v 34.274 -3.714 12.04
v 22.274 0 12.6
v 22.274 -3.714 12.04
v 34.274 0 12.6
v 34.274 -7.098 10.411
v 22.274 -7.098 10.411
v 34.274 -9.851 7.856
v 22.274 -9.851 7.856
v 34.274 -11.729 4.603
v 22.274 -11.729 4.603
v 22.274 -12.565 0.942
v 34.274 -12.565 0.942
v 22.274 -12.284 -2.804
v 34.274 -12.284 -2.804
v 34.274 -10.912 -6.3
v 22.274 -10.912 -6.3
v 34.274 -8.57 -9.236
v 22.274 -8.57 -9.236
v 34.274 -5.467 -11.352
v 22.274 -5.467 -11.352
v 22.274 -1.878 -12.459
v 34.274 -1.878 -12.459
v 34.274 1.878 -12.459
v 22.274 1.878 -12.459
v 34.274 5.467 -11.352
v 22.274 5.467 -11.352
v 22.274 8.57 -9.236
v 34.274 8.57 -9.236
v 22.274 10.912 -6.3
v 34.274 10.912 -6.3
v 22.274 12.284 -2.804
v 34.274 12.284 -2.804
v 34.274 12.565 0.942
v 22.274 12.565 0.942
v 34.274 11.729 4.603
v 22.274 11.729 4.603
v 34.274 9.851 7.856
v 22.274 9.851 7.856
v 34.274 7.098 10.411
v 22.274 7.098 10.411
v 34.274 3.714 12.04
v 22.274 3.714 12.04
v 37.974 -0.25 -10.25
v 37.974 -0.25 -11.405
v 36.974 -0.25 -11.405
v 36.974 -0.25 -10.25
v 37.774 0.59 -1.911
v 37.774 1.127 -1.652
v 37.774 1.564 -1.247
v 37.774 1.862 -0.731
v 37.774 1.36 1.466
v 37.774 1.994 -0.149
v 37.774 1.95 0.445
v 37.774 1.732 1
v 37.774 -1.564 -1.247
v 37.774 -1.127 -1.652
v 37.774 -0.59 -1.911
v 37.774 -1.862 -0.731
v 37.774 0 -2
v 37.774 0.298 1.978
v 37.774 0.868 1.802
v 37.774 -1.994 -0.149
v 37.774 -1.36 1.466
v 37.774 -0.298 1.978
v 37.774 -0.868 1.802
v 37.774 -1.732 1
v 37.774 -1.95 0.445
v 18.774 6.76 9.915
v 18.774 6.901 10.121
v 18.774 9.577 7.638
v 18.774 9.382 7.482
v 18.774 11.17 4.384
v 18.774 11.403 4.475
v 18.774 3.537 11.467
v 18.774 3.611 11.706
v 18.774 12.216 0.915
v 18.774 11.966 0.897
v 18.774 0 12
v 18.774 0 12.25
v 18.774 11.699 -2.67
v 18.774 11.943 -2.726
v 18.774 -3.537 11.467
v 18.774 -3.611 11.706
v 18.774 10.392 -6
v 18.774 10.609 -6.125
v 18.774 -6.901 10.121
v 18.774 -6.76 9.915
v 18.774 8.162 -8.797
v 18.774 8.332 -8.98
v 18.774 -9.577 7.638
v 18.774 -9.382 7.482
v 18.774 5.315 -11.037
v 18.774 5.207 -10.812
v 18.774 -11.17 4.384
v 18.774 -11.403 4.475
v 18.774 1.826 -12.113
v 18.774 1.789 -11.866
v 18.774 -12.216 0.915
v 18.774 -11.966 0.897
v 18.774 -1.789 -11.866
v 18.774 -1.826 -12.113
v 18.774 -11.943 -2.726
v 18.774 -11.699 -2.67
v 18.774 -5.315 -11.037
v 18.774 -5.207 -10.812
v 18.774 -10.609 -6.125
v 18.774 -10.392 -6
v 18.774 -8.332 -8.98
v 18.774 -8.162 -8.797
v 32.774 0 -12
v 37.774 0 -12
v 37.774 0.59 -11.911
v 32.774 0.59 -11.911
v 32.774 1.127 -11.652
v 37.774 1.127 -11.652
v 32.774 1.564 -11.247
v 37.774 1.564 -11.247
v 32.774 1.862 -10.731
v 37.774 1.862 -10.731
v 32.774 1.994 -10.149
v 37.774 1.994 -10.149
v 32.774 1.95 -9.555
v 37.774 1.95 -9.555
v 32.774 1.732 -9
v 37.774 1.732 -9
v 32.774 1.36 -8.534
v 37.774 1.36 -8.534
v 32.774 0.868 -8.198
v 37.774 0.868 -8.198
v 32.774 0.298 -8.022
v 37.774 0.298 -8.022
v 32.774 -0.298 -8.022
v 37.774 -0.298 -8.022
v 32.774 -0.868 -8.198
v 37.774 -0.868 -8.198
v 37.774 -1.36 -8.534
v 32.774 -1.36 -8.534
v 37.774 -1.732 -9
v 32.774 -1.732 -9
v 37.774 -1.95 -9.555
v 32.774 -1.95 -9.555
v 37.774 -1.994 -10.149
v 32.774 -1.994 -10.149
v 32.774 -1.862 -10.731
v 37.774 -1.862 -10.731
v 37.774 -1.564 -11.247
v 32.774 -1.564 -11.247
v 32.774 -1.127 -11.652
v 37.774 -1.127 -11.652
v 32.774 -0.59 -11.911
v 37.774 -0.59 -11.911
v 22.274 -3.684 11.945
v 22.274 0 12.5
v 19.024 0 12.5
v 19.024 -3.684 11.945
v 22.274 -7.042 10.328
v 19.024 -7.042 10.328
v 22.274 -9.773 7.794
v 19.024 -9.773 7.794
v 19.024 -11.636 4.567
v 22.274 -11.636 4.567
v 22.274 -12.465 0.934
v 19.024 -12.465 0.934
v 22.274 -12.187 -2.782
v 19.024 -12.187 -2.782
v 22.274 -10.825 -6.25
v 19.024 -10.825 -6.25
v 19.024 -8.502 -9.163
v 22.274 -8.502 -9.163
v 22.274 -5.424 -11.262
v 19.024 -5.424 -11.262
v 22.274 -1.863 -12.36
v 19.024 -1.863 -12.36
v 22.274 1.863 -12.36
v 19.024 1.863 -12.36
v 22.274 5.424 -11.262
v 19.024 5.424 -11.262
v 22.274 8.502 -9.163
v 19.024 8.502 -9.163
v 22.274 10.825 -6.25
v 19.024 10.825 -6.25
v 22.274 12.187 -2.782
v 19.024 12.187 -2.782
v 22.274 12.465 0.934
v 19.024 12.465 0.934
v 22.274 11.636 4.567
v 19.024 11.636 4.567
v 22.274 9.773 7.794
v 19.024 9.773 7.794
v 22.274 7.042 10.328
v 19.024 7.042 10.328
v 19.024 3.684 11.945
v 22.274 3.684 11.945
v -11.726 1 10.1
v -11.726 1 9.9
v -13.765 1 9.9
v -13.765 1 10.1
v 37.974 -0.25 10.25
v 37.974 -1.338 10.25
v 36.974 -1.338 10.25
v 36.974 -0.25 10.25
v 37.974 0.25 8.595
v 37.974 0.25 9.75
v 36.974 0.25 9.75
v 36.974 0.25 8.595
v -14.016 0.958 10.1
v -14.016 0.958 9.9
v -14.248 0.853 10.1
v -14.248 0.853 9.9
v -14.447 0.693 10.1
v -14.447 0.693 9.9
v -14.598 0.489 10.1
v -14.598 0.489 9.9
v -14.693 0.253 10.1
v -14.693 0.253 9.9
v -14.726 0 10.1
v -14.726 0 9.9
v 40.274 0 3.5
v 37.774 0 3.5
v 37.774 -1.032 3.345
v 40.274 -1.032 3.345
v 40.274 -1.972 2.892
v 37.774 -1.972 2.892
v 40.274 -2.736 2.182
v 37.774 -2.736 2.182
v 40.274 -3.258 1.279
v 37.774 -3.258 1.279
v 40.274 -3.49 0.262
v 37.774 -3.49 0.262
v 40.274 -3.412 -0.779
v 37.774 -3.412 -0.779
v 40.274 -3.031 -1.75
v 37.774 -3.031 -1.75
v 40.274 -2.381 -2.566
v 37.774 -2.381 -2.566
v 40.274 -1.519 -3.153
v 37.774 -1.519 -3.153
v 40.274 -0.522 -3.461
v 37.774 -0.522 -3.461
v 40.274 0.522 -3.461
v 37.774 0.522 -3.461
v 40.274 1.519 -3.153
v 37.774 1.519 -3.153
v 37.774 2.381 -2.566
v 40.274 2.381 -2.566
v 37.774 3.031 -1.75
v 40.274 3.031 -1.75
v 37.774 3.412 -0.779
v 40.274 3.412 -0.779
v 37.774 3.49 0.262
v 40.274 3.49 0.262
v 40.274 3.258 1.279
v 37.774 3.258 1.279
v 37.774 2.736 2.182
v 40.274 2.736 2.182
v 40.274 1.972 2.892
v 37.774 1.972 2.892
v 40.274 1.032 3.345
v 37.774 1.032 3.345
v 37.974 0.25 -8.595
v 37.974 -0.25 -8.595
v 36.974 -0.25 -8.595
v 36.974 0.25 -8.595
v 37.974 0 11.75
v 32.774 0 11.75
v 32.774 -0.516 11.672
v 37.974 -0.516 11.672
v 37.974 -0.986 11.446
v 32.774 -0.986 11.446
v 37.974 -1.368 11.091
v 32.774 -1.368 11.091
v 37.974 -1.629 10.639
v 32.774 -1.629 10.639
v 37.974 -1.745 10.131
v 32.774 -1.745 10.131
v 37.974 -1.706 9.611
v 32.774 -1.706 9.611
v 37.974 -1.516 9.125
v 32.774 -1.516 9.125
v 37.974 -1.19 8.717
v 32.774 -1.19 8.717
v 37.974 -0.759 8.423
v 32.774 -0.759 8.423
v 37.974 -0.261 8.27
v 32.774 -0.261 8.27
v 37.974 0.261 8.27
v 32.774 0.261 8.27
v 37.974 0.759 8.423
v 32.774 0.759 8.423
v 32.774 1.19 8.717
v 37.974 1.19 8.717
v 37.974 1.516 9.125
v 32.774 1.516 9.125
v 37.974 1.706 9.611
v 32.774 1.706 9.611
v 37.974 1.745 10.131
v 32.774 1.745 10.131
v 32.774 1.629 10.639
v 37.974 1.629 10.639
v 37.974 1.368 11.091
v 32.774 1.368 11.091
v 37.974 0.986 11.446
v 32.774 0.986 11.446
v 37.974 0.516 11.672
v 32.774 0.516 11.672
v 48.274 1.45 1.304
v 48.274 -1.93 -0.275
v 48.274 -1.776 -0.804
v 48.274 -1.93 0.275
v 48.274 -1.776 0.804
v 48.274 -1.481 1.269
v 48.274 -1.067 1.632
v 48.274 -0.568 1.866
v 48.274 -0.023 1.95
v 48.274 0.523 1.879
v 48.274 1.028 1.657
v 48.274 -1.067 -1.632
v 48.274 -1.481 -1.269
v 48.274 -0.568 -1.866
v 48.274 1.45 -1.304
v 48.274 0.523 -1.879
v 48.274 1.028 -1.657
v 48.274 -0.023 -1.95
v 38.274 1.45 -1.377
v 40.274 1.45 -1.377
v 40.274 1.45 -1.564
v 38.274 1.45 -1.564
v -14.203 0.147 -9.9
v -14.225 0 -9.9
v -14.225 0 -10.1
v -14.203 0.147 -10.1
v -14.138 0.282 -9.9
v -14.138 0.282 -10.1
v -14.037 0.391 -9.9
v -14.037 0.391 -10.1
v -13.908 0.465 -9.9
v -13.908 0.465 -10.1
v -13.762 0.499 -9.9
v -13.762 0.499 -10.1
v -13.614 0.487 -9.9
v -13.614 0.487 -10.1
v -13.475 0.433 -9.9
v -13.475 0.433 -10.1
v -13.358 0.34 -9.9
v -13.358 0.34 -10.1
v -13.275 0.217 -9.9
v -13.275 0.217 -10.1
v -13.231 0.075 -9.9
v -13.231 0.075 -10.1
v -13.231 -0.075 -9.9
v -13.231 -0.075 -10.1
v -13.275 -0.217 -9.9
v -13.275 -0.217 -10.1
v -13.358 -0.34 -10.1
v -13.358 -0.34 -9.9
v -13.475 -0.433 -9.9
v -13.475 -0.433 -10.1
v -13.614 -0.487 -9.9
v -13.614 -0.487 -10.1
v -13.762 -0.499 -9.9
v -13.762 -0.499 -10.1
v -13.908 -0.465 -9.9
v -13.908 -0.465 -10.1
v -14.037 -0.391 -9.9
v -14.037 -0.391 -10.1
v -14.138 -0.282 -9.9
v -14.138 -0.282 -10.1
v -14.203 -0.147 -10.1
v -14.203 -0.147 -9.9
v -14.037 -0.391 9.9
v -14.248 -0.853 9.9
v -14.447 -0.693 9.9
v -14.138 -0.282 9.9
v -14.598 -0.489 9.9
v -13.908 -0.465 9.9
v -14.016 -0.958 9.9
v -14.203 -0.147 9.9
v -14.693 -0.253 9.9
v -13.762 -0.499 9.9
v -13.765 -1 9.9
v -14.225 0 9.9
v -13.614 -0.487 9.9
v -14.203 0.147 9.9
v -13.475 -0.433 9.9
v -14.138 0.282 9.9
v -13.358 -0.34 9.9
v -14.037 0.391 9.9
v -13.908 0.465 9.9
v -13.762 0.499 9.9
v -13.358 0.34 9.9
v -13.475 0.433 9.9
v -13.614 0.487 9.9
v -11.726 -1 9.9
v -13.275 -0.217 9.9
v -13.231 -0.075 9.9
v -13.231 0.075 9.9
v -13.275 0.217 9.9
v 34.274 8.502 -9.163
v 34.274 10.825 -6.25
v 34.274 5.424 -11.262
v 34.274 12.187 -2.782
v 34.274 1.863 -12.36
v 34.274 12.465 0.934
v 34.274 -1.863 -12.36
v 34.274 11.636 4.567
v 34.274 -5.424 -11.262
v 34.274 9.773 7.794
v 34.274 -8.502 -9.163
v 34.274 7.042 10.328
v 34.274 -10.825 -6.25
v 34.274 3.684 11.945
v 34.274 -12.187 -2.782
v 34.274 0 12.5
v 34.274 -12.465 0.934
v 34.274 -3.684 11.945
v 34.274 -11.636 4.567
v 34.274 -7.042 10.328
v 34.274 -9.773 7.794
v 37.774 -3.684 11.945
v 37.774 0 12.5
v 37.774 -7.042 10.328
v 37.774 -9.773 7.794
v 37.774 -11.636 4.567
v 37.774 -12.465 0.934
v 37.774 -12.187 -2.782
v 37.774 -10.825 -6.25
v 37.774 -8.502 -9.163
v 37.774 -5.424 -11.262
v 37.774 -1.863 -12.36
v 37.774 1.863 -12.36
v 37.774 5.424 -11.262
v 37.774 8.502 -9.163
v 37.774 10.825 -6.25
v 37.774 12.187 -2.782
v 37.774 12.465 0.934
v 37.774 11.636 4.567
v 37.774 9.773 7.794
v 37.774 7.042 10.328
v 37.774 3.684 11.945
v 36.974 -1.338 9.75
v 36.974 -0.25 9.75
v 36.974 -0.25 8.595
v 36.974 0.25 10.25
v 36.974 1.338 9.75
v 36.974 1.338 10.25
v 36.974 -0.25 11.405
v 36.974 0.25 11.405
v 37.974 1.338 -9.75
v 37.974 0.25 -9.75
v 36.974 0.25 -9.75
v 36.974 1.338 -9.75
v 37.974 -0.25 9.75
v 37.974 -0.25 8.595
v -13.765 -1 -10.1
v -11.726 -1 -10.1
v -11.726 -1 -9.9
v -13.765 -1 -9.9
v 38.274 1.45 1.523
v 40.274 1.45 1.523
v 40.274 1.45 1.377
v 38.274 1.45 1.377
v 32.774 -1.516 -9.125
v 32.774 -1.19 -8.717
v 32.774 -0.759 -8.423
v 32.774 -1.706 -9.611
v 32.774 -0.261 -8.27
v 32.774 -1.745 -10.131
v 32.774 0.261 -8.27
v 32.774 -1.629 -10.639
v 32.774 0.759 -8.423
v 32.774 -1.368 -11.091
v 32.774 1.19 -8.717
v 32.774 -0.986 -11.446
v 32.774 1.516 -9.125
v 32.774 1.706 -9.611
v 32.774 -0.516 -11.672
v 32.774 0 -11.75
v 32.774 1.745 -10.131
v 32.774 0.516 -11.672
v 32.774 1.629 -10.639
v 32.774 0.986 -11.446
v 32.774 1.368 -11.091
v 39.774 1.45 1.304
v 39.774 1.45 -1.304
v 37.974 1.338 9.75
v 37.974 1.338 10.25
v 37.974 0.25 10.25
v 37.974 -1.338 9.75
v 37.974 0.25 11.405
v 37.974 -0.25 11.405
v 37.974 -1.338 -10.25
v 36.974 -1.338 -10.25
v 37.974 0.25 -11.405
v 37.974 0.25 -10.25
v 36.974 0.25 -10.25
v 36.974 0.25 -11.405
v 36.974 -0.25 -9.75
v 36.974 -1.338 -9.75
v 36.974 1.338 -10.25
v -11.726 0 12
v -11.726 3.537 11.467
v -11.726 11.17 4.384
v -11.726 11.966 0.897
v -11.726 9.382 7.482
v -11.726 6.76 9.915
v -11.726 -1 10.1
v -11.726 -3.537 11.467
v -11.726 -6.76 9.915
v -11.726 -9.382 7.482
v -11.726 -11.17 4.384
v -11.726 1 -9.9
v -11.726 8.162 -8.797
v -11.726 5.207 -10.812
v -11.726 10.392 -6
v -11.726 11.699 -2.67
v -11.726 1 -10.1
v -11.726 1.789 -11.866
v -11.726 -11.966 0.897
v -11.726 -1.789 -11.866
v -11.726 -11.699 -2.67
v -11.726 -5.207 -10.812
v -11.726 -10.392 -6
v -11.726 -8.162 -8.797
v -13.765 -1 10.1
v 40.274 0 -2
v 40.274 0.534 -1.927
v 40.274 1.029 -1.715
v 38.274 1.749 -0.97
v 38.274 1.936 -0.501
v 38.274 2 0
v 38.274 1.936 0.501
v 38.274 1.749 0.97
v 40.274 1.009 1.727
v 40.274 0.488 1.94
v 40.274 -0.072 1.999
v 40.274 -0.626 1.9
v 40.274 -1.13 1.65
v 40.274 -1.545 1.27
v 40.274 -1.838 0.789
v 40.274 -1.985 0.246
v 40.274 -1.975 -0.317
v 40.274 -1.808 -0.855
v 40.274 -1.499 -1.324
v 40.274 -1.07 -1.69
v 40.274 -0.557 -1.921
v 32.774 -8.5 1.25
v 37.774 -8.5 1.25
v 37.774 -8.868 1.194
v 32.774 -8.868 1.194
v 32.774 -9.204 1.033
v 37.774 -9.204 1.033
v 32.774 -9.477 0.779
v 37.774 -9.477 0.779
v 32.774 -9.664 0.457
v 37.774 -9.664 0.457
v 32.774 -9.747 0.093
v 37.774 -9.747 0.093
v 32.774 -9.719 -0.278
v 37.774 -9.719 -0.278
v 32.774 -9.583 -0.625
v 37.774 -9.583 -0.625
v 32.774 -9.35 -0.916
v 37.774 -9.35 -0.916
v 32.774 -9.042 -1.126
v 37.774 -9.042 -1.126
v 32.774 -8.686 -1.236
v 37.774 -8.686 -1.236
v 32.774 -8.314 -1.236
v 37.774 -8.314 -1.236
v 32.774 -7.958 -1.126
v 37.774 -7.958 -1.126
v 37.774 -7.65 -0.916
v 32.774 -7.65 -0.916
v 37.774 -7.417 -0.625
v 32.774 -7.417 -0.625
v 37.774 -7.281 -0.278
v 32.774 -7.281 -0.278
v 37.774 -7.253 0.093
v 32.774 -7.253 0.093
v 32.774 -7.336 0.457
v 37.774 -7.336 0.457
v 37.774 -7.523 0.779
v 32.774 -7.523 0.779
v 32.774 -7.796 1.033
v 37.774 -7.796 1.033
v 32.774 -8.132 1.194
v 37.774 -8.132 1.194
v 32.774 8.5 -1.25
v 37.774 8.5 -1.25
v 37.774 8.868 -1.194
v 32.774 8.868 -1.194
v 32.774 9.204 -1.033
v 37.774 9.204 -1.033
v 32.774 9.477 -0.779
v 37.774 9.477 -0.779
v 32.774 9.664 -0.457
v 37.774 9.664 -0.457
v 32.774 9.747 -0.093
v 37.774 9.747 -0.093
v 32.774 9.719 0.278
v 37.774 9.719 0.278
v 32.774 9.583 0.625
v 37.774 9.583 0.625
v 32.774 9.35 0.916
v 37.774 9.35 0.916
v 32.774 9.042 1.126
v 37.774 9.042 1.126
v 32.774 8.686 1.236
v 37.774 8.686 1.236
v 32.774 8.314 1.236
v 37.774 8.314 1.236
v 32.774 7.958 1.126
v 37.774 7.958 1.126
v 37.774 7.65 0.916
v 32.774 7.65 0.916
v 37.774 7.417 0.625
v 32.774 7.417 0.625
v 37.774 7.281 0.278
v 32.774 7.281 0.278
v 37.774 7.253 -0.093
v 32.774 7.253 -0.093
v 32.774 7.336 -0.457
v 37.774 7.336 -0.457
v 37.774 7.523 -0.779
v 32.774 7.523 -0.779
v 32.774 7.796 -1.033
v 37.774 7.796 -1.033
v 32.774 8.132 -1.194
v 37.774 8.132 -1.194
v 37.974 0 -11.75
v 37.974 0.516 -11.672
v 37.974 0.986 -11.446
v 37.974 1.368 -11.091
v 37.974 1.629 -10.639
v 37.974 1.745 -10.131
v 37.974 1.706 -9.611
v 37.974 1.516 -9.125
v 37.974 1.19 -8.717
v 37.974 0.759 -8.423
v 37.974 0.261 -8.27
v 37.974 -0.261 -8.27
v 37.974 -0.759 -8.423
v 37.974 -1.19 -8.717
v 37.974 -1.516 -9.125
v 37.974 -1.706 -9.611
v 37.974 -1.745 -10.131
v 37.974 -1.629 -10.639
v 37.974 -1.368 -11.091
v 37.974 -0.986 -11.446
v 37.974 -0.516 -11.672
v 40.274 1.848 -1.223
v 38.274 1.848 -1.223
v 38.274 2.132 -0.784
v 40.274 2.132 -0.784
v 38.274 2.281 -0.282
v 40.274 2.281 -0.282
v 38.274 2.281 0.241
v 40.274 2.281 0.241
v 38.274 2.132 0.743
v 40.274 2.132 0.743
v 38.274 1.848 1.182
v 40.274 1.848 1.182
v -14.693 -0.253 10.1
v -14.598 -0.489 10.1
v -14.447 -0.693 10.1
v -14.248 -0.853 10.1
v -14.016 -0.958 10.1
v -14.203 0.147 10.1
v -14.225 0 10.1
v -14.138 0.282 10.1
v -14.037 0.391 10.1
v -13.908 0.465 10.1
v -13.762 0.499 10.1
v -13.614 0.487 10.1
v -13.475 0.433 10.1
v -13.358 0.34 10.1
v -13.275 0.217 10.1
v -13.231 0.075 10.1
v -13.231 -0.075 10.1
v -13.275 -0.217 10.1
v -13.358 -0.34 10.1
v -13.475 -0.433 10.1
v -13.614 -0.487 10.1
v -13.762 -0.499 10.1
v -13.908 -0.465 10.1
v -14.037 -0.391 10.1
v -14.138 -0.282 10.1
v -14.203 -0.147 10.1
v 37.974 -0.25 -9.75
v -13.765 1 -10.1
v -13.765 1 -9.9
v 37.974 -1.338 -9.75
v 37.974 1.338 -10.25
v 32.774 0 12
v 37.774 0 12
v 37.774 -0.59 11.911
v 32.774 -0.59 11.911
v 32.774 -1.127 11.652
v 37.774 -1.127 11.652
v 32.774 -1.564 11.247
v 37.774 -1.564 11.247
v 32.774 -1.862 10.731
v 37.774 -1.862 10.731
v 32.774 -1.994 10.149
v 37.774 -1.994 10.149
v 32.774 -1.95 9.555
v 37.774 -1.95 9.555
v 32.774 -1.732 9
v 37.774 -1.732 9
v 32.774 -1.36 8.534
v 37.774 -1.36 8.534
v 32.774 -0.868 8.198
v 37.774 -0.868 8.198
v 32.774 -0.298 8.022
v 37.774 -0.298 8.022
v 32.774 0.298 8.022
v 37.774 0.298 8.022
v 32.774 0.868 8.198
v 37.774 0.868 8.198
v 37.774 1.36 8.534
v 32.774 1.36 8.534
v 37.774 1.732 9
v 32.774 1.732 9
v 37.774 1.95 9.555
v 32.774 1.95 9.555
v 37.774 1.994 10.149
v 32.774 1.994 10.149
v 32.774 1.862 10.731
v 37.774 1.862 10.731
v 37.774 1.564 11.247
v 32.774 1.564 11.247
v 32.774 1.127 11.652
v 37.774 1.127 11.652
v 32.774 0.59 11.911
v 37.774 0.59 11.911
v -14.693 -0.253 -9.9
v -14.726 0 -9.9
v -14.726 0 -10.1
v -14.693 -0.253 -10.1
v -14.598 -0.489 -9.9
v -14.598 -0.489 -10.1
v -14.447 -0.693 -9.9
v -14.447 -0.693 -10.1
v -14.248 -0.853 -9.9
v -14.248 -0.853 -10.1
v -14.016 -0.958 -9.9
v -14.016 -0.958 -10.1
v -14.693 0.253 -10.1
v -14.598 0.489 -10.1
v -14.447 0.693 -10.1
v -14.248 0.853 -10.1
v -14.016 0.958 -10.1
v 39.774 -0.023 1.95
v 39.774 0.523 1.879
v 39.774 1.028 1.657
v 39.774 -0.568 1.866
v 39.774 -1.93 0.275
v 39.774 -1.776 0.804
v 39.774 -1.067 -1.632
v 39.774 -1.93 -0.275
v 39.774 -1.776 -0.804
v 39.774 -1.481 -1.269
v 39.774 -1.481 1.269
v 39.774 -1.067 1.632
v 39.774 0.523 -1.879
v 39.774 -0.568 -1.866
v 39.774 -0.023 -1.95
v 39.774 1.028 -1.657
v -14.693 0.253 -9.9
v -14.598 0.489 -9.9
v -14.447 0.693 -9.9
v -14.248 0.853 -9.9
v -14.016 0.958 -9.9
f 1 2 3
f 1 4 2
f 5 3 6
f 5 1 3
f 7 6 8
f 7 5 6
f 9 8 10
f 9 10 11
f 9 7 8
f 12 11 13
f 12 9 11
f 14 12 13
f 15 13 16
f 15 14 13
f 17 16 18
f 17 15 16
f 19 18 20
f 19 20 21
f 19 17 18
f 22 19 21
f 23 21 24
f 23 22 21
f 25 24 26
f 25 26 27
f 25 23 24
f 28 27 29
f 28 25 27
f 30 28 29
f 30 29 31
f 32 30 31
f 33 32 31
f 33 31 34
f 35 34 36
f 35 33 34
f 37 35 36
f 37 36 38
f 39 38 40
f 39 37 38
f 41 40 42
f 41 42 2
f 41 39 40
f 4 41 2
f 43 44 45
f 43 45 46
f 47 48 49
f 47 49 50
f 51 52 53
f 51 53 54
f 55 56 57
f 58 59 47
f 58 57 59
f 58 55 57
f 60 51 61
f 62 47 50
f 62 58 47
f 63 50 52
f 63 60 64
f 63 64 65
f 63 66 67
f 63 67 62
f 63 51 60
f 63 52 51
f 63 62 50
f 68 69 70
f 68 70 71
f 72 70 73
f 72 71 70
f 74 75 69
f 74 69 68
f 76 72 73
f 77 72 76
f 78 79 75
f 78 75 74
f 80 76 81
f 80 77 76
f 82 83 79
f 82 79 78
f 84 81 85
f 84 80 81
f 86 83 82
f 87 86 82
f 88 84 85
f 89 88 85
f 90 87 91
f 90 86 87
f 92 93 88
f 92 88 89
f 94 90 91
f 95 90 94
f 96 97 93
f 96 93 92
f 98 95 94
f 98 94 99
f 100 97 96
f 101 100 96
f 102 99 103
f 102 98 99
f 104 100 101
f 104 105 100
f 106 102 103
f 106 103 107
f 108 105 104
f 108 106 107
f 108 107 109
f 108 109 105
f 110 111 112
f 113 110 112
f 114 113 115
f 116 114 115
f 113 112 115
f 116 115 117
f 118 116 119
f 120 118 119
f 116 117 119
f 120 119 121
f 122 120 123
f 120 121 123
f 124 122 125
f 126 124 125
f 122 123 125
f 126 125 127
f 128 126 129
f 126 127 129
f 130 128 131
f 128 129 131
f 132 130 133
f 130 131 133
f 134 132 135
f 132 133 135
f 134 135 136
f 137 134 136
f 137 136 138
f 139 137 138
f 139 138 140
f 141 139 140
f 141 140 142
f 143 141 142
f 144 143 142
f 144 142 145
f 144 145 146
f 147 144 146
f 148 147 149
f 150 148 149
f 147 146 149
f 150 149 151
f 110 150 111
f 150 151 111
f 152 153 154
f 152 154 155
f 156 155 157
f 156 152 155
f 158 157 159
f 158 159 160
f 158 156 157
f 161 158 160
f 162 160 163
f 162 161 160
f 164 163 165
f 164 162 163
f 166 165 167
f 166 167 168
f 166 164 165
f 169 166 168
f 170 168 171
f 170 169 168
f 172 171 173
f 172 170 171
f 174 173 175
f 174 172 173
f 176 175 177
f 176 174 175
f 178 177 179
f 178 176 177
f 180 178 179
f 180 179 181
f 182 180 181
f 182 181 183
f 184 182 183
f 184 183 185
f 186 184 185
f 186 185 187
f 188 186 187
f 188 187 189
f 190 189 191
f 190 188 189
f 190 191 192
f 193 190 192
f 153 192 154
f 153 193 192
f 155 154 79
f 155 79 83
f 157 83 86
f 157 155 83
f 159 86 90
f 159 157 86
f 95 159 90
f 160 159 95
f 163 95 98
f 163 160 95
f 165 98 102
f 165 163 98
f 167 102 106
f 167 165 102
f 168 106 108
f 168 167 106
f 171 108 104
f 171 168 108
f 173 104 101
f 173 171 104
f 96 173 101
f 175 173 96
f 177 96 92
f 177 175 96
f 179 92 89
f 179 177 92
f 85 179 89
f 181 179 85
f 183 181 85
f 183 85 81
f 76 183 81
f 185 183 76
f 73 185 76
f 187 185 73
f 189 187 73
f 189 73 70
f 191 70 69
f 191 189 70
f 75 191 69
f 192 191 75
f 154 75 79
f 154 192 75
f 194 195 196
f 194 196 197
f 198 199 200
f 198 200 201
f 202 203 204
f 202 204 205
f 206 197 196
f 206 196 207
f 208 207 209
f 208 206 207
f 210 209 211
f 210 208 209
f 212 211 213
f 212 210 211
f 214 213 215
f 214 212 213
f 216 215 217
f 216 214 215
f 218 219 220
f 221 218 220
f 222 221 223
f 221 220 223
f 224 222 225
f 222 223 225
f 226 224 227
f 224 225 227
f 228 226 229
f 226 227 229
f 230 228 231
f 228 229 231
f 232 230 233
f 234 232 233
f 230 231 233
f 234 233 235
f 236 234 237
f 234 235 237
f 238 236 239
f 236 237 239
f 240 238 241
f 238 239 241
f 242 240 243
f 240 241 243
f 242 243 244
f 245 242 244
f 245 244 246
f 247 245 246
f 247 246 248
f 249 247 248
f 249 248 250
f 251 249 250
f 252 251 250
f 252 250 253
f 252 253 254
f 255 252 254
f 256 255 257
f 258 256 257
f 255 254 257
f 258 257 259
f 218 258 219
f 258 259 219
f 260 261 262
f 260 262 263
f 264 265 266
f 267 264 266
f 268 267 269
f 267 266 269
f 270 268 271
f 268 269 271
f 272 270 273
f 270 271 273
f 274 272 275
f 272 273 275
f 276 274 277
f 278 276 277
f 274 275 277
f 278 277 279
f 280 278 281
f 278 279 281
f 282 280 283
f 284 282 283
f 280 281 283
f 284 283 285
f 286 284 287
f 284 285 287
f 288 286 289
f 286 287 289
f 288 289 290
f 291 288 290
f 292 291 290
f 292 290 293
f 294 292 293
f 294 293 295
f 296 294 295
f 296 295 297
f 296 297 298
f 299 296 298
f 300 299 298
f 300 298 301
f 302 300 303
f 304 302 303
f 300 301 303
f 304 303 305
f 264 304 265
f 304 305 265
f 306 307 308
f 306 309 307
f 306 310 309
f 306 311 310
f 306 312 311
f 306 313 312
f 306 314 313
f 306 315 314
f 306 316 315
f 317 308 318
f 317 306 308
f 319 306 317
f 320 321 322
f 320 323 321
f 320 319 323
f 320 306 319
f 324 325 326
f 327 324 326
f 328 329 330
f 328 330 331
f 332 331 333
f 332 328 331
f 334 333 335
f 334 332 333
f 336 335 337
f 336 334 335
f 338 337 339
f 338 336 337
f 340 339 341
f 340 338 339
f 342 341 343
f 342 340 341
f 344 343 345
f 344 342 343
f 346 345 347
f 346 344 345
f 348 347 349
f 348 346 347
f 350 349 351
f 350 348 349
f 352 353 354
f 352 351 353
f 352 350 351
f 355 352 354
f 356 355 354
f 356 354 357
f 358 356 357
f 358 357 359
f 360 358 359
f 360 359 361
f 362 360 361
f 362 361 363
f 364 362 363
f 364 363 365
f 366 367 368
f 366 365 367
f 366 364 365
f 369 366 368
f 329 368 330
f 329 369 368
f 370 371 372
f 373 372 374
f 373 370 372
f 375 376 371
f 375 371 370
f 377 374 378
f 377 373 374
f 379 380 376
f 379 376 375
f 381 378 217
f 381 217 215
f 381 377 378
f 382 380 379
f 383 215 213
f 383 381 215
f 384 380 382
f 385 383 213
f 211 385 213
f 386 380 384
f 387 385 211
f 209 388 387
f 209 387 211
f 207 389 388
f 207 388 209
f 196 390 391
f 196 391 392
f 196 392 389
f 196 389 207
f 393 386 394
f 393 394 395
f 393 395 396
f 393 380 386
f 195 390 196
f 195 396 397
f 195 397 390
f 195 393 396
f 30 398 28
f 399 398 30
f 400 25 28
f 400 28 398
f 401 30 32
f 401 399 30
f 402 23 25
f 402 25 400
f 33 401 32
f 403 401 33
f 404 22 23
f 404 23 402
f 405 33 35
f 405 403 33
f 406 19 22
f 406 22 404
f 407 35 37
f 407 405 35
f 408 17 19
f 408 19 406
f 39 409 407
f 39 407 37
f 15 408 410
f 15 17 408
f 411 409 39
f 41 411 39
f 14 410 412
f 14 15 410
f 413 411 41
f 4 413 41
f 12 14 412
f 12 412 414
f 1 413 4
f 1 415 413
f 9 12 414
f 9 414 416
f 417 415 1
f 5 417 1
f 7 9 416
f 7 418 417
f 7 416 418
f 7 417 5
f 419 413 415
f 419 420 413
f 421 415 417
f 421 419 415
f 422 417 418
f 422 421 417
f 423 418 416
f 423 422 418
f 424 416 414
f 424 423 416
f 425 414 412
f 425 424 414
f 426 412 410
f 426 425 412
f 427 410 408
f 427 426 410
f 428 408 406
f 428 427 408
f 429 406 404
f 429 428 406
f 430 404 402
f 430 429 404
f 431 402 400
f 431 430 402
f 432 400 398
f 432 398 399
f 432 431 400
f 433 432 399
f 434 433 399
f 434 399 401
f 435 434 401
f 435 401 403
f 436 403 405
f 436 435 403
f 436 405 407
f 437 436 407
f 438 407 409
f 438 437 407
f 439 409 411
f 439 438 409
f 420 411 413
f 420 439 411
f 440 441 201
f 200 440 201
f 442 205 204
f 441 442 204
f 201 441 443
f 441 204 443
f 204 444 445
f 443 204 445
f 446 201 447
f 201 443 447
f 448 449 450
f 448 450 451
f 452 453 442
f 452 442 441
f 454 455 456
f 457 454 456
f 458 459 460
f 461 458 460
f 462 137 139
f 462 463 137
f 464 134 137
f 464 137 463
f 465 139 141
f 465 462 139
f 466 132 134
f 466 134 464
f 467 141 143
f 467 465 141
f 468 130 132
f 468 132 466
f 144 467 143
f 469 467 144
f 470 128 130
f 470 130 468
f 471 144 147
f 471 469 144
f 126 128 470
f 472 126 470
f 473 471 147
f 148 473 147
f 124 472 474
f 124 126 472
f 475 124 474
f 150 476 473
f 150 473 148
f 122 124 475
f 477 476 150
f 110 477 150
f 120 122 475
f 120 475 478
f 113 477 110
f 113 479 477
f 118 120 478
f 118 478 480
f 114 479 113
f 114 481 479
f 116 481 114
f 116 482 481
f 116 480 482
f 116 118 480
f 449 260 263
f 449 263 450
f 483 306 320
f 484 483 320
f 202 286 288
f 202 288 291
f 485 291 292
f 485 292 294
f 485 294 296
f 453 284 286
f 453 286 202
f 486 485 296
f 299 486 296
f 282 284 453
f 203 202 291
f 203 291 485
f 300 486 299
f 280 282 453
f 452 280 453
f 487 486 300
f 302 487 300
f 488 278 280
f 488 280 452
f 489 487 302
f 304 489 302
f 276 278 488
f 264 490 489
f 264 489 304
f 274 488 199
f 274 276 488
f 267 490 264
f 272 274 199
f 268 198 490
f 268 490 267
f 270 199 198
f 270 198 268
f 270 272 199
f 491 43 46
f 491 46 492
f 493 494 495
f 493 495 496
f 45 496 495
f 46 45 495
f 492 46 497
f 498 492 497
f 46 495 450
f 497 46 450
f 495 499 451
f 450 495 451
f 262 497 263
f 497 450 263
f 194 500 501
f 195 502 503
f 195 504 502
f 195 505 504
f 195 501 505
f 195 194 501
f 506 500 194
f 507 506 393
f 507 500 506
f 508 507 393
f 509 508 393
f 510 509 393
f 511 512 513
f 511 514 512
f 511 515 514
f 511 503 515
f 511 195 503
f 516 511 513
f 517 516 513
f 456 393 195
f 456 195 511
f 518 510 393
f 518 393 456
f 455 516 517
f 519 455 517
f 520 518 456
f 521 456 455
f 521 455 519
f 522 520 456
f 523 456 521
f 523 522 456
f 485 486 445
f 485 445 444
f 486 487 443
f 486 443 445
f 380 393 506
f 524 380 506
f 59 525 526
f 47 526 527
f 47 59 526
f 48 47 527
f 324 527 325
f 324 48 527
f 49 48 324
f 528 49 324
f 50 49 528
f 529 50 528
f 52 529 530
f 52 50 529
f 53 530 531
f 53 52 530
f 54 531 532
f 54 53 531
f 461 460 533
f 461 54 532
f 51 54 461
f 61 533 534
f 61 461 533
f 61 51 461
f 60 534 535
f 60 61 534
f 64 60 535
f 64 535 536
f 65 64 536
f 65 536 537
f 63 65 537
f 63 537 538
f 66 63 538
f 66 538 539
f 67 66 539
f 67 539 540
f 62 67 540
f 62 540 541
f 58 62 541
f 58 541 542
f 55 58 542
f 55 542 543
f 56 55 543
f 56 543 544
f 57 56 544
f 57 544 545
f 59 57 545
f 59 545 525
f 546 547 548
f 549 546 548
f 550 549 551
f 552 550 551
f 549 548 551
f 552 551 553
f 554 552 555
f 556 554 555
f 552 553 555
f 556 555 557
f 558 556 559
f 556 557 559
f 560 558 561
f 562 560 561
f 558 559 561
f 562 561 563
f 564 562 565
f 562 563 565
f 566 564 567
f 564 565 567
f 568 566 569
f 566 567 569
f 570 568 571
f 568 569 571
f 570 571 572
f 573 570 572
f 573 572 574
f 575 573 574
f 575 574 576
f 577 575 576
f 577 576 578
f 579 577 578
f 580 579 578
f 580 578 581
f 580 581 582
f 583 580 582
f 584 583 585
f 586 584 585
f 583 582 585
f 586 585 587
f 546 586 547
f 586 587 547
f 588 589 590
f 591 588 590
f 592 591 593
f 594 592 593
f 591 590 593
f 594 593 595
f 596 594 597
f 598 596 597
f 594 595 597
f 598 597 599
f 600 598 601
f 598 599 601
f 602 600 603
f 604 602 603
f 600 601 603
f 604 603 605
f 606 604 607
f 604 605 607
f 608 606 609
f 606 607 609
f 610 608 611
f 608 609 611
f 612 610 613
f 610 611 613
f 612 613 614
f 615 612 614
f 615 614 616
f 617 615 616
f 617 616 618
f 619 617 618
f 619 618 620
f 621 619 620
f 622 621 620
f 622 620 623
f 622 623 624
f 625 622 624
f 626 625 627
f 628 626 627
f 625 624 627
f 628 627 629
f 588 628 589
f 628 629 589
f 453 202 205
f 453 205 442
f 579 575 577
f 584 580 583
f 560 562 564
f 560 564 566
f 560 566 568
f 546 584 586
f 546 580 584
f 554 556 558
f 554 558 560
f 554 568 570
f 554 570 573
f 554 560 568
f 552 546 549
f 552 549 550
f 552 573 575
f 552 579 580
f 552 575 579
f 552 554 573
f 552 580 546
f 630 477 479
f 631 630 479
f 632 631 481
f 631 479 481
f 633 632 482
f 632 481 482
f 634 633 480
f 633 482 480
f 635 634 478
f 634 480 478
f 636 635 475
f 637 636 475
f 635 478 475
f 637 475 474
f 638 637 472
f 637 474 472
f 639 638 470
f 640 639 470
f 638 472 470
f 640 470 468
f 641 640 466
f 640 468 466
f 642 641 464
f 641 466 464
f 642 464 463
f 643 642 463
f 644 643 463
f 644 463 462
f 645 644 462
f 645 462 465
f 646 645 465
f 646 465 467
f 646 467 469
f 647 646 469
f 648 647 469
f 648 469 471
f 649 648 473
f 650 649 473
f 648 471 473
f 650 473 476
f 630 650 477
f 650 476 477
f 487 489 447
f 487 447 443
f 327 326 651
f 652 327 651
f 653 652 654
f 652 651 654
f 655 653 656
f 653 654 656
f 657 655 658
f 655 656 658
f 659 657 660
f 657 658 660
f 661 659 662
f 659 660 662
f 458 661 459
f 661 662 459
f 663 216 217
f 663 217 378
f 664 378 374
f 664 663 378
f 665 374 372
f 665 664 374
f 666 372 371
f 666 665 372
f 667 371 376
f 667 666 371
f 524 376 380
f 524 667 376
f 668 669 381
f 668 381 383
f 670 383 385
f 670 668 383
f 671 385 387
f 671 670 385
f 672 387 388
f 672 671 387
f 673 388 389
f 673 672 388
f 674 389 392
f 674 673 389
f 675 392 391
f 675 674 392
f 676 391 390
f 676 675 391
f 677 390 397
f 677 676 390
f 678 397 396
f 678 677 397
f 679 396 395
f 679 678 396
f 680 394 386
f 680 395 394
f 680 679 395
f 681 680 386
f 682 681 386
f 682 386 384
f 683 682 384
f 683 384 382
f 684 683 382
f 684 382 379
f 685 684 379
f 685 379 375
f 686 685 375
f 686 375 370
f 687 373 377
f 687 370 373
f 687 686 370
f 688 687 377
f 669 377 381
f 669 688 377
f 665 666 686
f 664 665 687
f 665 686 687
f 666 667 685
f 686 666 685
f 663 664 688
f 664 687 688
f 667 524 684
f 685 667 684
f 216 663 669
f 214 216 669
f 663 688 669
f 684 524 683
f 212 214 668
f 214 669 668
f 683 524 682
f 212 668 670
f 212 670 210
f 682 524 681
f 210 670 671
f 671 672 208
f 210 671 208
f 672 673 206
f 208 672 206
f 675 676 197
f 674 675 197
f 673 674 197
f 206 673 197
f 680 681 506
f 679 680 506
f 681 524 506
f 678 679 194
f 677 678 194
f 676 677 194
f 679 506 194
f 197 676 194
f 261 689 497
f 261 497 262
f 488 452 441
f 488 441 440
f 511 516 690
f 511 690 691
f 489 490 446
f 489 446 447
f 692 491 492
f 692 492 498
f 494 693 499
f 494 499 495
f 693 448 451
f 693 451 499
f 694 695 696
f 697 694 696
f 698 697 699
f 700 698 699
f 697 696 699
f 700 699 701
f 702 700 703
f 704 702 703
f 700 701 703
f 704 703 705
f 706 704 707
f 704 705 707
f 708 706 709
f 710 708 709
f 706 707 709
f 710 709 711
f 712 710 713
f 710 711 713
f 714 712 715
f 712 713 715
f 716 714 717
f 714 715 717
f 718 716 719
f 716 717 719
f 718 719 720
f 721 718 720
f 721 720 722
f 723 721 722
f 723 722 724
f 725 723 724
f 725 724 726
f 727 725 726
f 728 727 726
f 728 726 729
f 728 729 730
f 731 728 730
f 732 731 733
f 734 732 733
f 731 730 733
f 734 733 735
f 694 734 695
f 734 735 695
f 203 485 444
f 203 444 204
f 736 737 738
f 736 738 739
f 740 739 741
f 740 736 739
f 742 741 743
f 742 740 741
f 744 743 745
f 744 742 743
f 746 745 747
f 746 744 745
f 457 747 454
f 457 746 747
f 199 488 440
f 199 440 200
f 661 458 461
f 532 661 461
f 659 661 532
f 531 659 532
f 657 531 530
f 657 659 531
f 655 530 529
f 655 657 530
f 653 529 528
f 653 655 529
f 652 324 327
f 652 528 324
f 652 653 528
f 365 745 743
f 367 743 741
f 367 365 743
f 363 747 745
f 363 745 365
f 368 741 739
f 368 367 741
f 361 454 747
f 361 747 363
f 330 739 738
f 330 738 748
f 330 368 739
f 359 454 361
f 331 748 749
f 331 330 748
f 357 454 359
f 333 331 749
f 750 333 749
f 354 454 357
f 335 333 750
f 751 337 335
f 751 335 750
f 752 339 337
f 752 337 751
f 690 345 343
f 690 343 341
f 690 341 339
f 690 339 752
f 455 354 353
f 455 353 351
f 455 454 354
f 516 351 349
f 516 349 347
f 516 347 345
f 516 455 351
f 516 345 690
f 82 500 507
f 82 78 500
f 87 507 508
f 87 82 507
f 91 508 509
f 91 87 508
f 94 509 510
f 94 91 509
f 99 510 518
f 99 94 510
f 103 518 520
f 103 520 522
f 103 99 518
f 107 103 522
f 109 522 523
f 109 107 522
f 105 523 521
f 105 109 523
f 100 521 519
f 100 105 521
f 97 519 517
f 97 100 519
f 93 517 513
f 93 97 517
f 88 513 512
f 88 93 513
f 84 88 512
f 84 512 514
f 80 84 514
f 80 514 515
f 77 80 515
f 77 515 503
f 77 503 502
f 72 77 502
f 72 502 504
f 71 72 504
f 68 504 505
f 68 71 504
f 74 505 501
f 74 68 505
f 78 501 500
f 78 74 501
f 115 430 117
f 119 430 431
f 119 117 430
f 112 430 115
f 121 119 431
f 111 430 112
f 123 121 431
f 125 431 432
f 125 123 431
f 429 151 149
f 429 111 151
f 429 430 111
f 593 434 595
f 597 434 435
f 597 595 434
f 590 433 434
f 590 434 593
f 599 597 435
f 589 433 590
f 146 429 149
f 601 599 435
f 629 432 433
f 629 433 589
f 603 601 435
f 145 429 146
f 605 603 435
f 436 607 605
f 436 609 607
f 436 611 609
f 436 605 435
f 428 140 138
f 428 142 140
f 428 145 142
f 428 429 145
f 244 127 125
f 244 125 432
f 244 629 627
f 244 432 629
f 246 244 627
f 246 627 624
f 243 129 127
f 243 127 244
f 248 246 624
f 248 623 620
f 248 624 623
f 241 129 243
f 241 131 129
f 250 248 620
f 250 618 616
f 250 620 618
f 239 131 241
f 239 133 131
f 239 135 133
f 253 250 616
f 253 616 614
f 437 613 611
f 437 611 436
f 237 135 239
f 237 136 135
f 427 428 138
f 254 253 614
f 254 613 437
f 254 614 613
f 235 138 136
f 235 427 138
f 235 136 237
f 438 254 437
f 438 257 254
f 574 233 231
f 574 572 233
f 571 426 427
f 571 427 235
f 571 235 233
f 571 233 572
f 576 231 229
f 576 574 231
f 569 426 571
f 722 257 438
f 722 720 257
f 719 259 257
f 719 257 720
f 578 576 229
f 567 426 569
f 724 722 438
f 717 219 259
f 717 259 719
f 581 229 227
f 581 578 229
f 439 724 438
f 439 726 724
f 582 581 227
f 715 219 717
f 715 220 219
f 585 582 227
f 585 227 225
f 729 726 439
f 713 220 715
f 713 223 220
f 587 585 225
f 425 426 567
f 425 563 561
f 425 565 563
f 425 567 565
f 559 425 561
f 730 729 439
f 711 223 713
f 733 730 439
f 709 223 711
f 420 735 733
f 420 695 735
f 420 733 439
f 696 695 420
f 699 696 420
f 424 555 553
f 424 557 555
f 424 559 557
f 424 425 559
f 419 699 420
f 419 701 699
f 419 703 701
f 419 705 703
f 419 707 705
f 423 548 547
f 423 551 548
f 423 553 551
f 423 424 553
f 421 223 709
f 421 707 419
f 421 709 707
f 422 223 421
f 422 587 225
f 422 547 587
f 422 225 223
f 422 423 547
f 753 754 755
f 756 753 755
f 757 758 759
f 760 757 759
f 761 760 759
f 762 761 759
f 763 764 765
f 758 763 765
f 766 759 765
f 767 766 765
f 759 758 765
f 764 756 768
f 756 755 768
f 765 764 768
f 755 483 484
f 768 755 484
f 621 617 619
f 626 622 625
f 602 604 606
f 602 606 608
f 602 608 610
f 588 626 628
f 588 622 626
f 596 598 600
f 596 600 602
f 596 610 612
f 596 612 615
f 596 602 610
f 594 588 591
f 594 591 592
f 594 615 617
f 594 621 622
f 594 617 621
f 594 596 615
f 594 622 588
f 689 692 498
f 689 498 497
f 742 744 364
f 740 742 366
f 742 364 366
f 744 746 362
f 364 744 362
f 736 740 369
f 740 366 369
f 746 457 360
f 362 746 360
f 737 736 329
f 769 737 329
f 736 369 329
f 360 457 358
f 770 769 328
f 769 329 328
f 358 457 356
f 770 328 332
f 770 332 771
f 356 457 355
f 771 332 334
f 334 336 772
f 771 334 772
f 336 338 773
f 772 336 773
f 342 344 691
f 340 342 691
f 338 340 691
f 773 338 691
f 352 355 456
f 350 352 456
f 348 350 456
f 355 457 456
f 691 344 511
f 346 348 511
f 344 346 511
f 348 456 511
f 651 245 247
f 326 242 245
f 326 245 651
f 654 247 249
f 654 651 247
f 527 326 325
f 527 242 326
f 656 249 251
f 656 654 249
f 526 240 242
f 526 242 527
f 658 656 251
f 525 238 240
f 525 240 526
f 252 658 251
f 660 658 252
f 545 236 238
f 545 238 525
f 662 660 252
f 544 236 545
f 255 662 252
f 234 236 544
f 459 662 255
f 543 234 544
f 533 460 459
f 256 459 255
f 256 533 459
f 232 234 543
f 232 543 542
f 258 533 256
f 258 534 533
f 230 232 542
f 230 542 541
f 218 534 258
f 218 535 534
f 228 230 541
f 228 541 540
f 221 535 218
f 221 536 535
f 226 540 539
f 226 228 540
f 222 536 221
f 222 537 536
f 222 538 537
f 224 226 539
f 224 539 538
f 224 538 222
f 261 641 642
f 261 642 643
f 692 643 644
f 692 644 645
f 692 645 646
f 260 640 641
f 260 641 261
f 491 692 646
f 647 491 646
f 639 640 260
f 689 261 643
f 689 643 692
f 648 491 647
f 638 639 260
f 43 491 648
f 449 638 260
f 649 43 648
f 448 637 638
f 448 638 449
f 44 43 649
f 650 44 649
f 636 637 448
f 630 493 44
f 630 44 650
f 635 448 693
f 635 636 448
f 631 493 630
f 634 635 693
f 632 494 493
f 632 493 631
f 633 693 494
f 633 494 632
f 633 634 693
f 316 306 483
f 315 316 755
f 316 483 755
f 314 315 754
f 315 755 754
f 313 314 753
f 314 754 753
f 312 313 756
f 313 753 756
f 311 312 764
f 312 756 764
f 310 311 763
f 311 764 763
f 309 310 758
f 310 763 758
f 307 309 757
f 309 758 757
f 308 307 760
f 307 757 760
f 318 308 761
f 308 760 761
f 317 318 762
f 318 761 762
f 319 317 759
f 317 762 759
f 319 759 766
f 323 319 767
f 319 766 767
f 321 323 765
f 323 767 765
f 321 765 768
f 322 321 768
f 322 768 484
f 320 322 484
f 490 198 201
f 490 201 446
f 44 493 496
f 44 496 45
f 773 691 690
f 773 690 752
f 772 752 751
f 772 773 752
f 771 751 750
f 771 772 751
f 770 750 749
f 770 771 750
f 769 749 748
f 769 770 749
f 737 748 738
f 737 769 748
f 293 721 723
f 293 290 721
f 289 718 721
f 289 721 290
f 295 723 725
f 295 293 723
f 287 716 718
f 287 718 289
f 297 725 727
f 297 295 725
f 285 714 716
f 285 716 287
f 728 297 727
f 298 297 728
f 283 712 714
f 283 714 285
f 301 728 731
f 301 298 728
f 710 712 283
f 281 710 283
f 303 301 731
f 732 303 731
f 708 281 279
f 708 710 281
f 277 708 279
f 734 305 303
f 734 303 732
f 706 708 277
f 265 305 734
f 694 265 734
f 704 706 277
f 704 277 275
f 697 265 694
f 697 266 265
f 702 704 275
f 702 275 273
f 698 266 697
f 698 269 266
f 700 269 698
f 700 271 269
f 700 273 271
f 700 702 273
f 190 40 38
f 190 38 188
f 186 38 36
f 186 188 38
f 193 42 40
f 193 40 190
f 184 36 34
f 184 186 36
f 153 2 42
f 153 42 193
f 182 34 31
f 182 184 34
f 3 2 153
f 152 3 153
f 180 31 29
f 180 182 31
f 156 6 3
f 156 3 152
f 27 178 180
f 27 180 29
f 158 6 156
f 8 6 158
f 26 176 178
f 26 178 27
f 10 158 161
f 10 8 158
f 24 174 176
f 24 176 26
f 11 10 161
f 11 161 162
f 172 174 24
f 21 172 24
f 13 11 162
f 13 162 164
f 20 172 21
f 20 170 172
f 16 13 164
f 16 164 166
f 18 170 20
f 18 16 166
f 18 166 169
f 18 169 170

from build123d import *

# Parameters (mm, degrees)
SKETCH3_R               = 3.5
SKETCH3_R_2             = 2
BOSS_EXTRUDE1_DEPTH     = 2.5
BOSS_EXTRUDE2_START     = 2
SKETCH4_R               = 1.95
BOSS_EXTRUDE2_DEPTH     = 8.5
CUT_EXTRUDE1_DEPTH      = 10
CHAMFER1_SIZE           = 0.25
SKETCH6_R               = 2
CUT_EXTRUDE2_DEPTH      = 5
SKETCH7_R               = 1.75
BOSS_EXTRUDE3_DEPTH     = 5.2
CUT_EXTRUDE4_DEPTH      = 1
SKETCH9_R               = 1.25
CUT_EXTRUDE5_DEPTH      = 5
SKETCH11_W              = 0.2
SKETCH11_H              = 2
BOSS_EXTRUDE4_DEPTH     = 3
CUT_EXTRUDE6_START      = -20.2
CUT_EXTRUDE6_DEPTH      = 20.2
CUT_EXTRUDE7_DEPTH      = 55.812850986
CUT_EXTRUDE7_DEPTH_BACK = 55.812850986
SKETCH13_R              = 0.5


# Read off the part's stored shape, not the designer's step: Cut-Extrude6
with BuildPart() as part:
    # Sketch1 → Revolve1 (revolve)
    with BuildSketch(Plane.XY, mode=Mode.PRIVATE) as revolve1_sk:
        Polygon((-11.725797436, 0), (-11.725797436, 12), (18.774202564, 12), (18.774202564, 12.5), (22.274202564, 12.5), (22.274202564, 12.6), (34.274202564, 12.6), (34.274202564, 12.5), (37.774202564, 12.5), (37.774202564, 0), align=None)
    revolve(revolve1_sk.sketch.rotate(Axis((-11.725797436, 0, 0), (1, 0, 0)), 90), axis=Axis((-11.725797436, 0, 0), (1, 0, 0)))

    # Sketch3 → Boss-Extrude1 (add)
    with BuildSketch(Plane(origin=(37.774202564, 0, 0), x_dir=(0, 0, -1), z_dir=(1, 0, 0))):
        with Locations(Location((0, 0, 0), (0, 0, 180))):
            Circle(SKETCH3_R)
        Circle(SKETCH3_R_2, mode=Mode.SUBTRACT)
    extrude(amount=BOSS_EXTRUDE1_DEPTH)


with BuildPart() as body_2:
    # Sketch4 → Boss-Extrude2 (new body)
    with BuildSketch(Plane(origin=(37.774202564, 0, 0), x_dir=(0, 0, -1), z_dir=(1, 0, 0)).offset(BOSS_EXTRUDE2_START)):
        Circle(SKETCH4_R)
    extrude(amount=BOSS_EXTRUDE2_DEPTH)


with BuildPart() as cut_extrude1_tool:
    # Sketch5 → Cut-Extrude1 (new body)
    with BuildSketch(Plane(origin=(48.274202564, 0, 0), x_dir=(0, 0, -1), z_dir=(1, 0, 0))):
        with BuildLine():
            Line((0, 1.45), (1.563854219, 1.45))
            ThreePointArc((1.563854219, 1.45), (0.020575485, 2.299790468), (-1.52270325, 1.45))
            Line((-1.52270325, 1.45), (0, 1.45))
        make_face()
    extrude(amount=-CUT_EXTRUDE1_DEPTH)


with BuildPart() as part_1:
    add(part.part)

    # Cut-Extrude1: cut by cut_extrude1_tool
    add(cut_extrude1_tool.part, mode=Mode.SUBTRACT)

    # Chamfer1
    chamfer1_edges = [part_1.edges().sort_by_distance(p)[0] for p in [
        (18.774202564, 0, -12.5),
    ]]
    chamfer(chamfer1_edges, length=CHAMFER1_SIZE)

    # Sketch6 → Cut-Extrude2 (cut)
    with BuildSketch(Plane(origin=(37.774202564, 0, 0), x_dir=(0, 0, -1), z_dir=(1, 0, 0))):
        with Locations((10, 0)):
            Circle(SKETCH6_R)
        with Locations(Location((-10, 0, 0), (0, 0, 180))):
            Circle(SKETCH6_R)
    extrude(amount=-CUT_EXTRUDE2_DEPTH, mode=Mode.SUBTRACT)

    # Sketch7 → Boss-Extrude3 (add)
    with BuildSketch(Plane(origin=(32.774202564, 0, 0), x_dir=(0, 0, -1), z_dir=(1, 0, 0))):
        with Locations((10, 0)):
            Circle(SKETCH7_R)
        with Locations(Location((-10, 0, 0), (0, 0, 180))):
            Circle(SKETCH7_R)
    extrude(amount=BOSS_EXTRUDE3_DEPTH)

    # Sketch8 → Cut-Extrude4 (cut)
    with BuildSketch(Plane(origin=(37.974202564, 0, 0), x_dir=(0, 0, -1), z_dir=(1, 0, 0))):
        Polygon((8.594754122, -0.25), (8.594754122, 0.25), (9.75, 0.25), (9.75, 1.338286548), (10.25, 1.338286548), (10.25, 0.25), (11.405245878, 0.25), (11.405245878, -0.25), (10.25, -0.25), (10.25, -1.338286548), (9.75, -1.338286548), (9.75, -0.25), align=None)
        Polygon((-10.25, -0.25), (-11.405245878, -0.25), (-11.405245878, 0.25), (-10.25, 0.25), (-10.25, 1.338286548), (-9.75, 1.338286548), (-9.75, 0.25), (-8.594754122, 0.25), (-8.594754122, -0.25), (-9.75, -0.25), (-9.75, -1.338286548), (-10.25, -1.338286548), align=None)
    extrude(amount=-CUT_EXTRUDE4_DEPTH, mode=Mode.SUBTRACT)

    # Sketch9 → Cut-Extrude5 (cut)
    with BuildSketch(Plane(origin=(37.774202564, 0, 0), x_dir=(0, 0, -1), z_dir=(1, 0, 0))):
        with Locations((0, 8.5)):
            Circle(SKETCH9_R)
        with Locations(Location((0, -8.5, 0), (0, 0, 180))):
            Circle(SKETCH9_R)
    extrude(amount=-CUT_EXTRUDE5_DEPTH, mode=Mode.SUBTRACT)

    # Sketch11 → Boss-Extrude4 (add)
    with BuildSketch(Plane.ZY.offset(11.725797436)):
        with Locations((10, 0)):
            Rectangle(SKETCH11_W, SKETCH11_H)
        with Locations((-10, 0)):
            Rectangle(SKETCH11_W, SKETCH11_H)
    extrude(amount=BOSS_EXTRUDE4_DEPTH)

    # Cut-Extrude6 outline → Cut-Extrude6 (cut)
    with BuildSketch(Plane(origin=(0, 0, -10.1), x_dir=(-1, 0, 0), z_dir=(0, 0, -1)).offset(CUT_EXTRUDE6_START)):
        with BuildLine():
            ThreePointArc((13.765046185, 1), (14.446690478, 0.693369124), (14.725797436, 0))
            Line((14.725797436, 0), (14.725797436, 1))
            Line((14.725797436, 1), (13.765046185, 1))
        make_face()
        with BuildLine():
            ThreePointArc((14.725797436, 0), (14.446690478, -0.693369124), (13.765046185, -1))
            Line((13.765046185, -1), (14.725797436, -1))
            Line((14.725797436, -1), (14.725797436, 0))
        make_face()
    extrude(amount=CUT_EXTRUDE6_DEPTH, mode=Mode.SUBTRACT)

    # Sketch13 → Cut-Extrude7 (cut, two sides: drawn at the far end of the back side and taken through both)
    with BuildSketch(Plane(origin=(0, 0, -10.1), x_dir=(-1, 0, 0), z_dir=(0, 0, -1)).offset(-CUT_EXTRUDE7_DEPTH_BACK)):
        with Locations((13.724995738, 0)):
            Circle(SKETCH13_R)
    extrude(amount=CUT_EXTRUDE7_DEPTH + CUT_EXTRUDE7_DEPTH_BACK, mode=Mode.SUBTRACT)


with BuildPart() as body_2_1:
    add(body_2.part)

    # Cut-Extrude1: cut by cut_extrude1_tool
    add(cut_extrude1_tool.part, mode=Mode.SUBTRACT)


solid = Compound([part_1.part, body_2_1.part])
